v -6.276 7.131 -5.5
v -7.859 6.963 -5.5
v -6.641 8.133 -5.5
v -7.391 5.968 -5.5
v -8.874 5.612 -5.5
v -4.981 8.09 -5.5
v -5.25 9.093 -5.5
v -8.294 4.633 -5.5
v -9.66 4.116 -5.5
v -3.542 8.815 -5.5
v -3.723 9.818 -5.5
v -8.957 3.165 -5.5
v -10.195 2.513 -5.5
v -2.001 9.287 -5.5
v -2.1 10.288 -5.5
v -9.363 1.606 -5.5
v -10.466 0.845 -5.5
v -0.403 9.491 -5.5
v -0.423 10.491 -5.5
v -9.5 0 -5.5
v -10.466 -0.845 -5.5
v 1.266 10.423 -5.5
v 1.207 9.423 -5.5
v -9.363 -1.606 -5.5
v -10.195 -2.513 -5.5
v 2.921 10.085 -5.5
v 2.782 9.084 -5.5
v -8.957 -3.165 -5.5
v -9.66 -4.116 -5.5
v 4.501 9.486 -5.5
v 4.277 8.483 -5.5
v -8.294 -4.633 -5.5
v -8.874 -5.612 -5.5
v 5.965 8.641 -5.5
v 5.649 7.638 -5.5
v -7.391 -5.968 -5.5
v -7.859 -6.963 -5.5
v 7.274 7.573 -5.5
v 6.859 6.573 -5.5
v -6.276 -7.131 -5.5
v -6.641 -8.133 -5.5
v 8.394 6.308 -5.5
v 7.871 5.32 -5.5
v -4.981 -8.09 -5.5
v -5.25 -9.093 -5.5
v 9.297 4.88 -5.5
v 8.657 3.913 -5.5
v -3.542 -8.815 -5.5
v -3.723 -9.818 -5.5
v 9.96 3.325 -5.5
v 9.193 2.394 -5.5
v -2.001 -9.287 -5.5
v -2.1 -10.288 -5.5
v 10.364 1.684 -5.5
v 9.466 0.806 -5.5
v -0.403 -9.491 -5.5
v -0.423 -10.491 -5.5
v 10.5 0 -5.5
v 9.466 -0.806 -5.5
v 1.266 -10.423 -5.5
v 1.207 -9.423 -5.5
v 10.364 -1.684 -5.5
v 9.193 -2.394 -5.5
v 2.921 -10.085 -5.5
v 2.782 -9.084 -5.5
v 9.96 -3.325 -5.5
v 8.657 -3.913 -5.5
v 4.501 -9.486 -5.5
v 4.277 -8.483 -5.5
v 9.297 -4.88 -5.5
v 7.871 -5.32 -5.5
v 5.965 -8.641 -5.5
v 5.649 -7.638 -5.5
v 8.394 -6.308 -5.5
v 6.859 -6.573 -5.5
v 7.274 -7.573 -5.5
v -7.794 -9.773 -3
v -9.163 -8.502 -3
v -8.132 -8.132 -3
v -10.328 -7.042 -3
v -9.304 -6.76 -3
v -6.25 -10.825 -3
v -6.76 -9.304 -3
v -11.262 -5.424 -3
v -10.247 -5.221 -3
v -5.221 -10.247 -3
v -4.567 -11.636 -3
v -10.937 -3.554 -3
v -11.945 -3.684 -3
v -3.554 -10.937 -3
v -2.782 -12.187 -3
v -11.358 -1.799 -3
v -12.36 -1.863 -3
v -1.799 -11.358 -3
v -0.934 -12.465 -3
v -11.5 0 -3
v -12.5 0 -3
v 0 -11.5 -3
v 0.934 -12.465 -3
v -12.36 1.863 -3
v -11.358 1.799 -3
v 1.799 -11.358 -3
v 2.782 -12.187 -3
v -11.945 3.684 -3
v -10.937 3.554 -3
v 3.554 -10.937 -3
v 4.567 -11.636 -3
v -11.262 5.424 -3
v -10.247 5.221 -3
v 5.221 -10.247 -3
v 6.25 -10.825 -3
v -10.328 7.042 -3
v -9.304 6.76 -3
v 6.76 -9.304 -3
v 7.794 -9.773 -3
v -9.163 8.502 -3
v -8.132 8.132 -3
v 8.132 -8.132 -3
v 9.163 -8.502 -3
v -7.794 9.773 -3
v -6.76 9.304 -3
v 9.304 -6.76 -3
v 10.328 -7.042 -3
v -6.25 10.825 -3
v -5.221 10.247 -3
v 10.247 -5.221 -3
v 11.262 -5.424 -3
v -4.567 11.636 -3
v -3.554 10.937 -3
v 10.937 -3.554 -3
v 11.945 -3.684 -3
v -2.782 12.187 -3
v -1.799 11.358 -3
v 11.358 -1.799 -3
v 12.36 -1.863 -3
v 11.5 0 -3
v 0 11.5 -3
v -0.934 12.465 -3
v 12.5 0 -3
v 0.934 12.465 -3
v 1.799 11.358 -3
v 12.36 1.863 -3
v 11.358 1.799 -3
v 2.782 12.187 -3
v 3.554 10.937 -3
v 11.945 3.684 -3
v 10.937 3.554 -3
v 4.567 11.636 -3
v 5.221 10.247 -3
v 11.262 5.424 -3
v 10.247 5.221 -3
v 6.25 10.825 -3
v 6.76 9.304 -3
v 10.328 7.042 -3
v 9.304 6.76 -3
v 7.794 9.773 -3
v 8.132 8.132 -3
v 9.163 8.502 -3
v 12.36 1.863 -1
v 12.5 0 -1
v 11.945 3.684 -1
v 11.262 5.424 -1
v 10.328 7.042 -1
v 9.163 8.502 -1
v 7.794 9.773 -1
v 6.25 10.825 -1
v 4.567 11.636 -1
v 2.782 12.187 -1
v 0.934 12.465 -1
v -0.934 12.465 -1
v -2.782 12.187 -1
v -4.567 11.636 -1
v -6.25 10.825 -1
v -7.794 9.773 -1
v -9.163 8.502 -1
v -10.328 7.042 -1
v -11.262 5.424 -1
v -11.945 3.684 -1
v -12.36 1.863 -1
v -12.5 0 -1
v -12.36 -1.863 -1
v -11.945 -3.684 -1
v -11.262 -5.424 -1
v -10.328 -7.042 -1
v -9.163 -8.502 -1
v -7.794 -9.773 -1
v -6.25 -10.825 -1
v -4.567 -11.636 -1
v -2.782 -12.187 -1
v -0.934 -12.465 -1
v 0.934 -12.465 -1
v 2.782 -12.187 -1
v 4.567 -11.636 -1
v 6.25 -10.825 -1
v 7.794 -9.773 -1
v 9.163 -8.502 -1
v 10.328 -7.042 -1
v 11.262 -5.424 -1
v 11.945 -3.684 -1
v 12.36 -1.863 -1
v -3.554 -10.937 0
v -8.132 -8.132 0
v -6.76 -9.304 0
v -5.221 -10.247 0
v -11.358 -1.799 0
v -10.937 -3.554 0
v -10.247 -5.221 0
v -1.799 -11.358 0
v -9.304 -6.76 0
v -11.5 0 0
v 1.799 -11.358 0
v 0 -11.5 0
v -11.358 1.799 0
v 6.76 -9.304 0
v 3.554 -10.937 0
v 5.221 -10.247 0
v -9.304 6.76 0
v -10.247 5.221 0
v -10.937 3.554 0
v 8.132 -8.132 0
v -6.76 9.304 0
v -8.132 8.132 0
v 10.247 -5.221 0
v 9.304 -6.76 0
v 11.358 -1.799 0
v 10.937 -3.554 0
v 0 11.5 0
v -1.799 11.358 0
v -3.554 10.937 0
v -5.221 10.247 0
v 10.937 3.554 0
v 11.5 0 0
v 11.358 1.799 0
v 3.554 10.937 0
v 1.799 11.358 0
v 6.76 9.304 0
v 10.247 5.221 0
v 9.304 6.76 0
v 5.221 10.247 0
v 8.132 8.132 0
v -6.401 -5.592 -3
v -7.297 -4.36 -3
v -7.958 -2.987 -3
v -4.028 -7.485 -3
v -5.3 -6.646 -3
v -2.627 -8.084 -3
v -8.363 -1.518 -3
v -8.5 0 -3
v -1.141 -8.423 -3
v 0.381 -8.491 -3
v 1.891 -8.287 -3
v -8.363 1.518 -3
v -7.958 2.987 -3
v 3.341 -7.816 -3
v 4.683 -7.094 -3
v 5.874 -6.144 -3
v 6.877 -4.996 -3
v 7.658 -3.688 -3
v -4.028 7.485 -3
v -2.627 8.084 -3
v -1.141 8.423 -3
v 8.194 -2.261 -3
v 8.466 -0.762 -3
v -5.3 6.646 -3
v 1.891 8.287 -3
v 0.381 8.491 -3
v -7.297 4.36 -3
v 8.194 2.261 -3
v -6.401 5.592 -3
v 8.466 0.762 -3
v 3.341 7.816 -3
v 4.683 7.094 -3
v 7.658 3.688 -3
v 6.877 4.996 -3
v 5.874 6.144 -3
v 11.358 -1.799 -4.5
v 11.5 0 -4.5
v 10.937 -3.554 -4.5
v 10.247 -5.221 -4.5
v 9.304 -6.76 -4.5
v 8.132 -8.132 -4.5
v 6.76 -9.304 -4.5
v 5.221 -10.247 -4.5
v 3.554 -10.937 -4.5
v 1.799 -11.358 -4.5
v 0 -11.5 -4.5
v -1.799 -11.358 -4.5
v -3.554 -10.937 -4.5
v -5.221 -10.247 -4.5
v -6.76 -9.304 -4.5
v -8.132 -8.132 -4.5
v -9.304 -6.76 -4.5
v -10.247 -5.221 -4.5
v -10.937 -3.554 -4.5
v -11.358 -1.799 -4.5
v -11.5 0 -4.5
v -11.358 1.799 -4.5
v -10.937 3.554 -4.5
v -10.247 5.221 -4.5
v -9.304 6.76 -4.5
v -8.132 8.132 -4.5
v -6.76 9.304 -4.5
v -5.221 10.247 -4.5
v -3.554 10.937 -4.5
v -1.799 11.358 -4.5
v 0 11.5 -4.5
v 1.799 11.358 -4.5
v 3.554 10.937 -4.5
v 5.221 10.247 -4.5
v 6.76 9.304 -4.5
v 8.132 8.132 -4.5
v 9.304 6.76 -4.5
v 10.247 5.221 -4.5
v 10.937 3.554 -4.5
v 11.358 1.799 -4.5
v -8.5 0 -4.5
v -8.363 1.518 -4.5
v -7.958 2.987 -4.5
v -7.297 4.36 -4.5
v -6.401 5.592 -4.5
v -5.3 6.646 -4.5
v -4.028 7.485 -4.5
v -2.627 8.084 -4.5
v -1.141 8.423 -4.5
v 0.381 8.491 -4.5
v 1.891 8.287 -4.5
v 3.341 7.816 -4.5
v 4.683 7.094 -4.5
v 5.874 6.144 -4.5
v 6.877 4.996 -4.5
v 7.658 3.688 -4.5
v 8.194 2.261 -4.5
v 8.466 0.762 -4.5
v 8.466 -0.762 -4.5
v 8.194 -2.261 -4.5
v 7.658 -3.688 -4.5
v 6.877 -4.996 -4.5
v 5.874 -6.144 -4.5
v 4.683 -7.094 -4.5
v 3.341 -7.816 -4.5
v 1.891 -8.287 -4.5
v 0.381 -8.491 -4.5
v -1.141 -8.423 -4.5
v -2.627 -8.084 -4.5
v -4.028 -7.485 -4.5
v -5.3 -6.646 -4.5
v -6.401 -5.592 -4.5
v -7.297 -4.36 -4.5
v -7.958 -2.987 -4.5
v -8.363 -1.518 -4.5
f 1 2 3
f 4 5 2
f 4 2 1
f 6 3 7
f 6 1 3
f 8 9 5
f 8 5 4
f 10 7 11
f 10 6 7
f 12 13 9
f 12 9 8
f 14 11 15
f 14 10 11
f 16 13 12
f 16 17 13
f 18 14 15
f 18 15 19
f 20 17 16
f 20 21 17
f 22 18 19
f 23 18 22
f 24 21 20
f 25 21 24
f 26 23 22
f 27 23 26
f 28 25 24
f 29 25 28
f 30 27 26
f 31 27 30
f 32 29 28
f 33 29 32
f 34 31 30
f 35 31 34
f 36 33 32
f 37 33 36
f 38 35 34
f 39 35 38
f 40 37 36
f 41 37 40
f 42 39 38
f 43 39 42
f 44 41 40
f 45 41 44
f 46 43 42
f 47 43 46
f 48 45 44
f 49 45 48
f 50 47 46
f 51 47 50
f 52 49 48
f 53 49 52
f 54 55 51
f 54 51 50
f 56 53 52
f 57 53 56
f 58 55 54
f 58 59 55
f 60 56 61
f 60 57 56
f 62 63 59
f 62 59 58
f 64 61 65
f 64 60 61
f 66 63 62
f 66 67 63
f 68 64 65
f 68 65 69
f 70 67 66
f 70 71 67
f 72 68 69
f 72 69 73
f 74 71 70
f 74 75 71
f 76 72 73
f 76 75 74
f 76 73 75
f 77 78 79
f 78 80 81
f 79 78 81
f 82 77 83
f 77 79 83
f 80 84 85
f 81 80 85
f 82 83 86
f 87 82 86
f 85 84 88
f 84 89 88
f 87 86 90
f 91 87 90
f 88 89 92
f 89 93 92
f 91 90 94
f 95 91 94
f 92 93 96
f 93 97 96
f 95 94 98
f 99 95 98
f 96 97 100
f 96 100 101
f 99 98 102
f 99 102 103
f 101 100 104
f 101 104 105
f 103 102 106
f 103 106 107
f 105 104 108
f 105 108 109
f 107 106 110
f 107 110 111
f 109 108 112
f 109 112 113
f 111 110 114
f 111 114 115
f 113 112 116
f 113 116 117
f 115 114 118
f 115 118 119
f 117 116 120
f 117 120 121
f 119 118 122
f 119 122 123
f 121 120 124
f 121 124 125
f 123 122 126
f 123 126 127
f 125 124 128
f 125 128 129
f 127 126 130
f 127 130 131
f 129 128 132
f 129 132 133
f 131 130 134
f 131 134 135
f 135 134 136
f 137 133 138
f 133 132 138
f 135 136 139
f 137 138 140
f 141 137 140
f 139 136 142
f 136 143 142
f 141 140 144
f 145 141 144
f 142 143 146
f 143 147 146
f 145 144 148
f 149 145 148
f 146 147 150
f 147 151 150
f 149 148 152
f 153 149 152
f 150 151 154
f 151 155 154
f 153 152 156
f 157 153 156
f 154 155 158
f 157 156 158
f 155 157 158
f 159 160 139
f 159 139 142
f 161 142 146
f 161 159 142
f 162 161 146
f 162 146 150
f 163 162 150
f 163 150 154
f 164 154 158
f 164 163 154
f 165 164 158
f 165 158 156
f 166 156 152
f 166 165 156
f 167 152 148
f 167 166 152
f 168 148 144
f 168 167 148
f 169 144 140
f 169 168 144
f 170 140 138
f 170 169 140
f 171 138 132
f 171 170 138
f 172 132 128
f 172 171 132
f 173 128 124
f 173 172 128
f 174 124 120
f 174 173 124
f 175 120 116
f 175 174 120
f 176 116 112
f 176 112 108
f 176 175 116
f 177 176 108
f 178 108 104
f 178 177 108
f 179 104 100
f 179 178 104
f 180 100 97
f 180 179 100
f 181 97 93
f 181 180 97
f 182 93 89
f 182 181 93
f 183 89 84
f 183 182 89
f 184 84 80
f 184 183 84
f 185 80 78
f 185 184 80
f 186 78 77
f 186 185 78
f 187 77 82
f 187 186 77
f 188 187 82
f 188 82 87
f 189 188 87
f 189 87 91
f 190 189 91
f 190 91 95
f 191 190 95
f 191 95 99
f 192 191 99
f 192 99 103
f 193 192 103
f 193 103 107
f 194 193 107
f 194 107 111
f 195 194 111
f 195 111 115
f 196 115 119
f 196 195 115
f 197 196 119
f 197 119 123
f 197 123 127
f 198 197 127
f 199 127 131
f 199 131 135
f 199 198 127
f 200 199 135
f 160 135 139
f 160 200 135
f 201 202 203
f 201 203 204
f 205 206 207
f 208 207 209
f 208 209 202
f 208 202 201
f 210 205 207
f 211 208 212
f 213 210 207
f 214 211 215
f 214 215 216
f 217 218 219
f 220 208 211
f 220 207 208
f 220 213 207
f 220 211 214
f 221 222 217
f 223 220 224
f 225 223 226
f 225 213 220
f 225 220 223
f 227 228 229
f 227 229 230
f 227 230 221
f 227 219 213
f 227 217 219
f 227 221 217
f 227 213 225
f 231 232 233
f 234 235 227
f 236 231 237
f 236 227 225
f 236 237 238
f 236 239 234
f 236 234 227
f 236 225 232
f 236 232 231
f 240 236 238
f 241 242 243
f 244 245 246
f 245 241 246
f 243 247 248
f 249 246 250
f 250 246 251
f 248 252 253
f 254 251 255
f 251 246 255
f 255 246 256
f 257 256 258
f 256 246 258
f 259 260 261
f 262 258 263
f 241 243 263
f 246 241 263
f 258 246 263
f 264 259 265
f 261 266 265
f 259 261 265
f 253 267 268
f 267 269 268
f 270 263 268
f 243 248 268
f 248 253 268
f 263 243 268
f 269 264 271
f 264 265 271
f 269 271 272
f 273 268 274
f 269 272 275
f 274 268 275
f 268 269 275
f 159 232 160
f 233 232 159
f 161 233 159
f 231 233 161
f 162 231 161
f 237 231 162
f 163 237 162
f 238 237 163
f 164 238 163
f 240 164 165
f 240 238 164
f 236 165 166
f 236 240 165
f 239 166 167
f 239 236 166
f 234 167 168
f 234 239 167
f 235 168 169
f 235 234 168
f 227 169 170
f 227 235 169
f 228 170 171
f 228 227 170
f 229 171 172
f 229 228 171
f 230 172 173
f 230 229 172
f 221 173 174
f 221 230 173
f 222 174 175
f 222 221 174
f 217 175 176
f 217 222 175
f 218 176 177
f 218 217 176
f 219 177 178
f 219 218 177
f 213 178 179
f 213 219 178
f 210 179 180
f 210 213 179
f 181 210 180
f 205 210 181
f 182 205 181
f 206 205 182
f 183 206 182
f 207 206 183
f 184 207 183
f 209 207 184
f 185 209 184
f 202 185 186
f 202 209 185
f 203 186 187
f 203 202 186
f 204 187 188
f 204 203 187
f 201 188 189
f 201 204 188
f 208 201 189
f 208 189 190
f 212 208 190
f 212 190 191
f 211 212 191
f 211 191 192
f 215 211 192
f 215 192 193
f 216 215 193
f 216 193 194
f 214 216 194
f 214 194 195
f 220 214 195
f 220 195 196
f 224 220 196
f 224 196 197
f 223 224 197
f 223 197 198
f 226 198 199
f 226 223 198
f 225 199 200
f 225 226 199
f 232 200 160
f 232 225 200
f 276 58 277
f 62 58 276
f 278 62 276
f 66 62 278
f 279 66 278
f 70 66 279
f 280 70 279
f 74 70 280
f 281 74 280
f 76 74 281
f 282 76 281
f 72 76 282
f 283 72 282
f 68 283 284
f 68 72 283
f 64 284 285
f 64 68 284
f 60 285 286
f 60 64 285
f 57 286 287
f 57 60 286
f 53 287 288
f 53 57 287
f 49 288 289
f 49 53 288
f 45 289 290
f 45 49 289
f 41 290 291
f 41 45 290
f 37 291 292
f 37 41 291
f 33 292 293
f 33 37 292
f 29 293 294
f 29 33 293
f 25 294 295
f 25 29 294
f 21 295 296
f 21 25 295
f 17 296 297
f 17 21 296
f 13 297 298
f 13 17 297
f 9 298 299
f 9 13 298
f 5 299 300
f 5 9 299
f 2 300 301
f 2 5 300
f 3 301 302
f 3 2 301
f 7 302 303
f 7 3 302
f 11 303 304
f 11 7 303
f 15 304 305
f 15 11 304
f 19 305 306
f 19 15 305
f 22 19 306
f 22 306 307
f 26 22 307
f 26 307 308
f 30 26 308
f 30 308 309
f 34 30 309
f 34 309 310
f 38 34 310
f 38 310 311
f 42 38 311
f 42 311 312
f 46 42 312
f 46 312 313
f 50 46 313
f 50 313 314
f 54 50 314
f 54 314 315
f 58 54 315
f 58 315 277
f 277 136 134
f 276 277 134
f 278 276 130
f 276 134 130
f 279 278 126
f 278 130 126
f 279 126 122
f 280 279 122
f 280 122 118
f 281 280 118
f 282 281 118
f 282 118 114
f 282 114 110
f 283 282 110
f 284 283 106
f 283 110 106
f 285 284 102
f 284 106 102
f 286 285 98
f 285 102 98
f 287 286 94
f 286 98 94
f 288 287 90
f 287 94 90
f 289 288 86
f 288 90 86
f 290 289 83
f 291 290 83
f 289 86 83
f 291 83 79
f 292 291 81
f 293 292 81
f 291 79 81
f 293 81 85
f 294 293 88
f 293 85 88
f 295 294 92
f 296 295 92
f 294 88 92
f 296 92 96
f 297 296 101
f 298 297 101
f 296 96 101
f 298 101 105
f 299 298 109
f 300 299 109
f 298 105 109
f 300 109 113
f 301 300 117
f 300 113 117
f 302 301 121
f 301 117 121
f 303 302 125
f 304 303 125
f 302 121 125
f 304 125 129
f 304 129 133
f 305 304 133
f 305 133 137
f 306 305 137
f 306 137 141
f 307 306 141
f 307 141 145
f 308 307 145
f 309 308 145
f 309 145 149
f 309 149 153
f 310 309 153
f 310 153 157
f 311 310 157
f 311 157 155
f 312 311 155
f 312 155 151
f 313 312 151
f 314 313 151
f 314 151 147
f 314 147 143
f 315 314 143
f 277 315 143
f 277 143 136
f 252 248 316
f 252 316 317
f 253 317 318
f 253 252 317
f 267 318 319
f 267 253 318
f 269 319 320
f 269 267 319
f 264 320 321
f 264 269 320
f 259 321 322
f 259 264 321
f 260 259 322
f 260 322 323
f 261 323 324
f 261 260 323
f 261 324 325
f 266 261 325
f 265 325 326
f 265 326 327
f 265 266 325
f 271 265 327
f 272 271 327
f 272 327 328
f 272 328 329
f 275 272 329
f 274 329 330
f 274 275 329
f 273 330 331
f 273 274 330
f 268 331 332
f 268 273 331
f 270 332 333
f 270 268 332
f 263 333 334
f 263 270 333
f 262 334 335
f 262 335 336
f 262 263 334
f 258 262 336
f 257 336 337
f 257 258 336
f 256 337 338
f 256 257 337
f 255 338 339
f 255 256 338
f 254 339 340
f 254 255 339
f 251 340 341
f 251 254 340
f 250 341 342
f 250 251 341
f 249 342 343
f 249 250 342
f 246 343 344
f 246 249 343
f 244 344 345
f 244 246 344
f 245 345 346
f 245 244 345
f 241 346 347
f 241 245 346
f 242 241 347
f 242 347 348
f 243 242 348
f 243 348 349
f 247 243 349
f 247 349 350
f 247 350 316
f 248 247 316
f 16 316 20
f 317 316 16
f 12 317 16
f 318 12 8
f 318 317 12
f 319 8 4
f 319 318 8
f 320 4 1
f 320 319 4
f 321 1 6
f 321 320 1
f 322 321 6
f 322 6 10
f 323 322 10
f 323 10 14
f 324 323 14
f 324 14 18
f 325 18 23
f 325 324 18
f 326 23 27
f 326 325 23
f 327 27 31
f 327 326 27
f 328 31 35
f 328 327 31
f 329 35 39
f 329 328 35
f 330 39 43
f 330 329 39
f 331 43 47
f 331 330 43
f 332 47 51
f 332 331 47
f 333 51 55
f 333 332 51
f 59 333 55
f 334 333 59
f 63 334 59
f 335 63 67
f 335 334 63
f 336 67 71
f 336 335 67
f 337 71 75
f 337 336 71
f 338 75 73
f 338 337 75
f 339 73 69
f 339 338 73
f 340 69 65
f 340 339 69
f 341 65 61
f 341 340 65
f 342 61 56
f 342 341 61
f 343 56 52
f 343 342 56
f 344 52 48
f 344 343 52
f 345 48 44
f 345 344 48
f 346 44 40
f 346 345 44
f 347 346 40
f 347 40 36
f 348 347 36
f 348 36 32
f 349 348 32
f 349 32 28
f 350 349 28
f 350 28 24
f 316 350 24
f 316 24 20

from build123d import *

# Parameters (mm, degrees)
SKETCH1_R                = 12.5
CORPO_DEPTH              = 3
SKETCH2_R                = 11.5
SKETCH2_R_2              = 8.5
EIXO_DE_ENCAIXE_20_DEPTH = 2.5
CHANFRO_1X45_SIZE        = 1


with BuildPart() as part:
    # Sketch1 → Corpo (new body)
    with BuildSketch(Plane.XY):
        Circle(SKETCH1_R)
    extrude(amount=-CORPO_DEPTH)

    # Sketch2 → Eixo de Encaixe - Ø20 (add)
    with BuildSketch(Plane(origin=(0, 0, -3), x_dir=(-1, 0, 0), z_dir=(0, 0, -1))):
        with Locations(Location((0, 0, 0), (0, 0, 180))):
            Circle(SKETCH2_R)
        Circle(SKETCH2_R_2, mode=Mode.SUBTRACT)
    extrude(amount=EIXO_DE_ENCAIXE_20_DEPTH)

    # Chanfro 1x45°
    chanfro_1x45_edges = [part.edges().sort_by_distance(p)[0] for p in [
        (-12.5, 0, 0),
        (-11.5, 0, -5.5),
        (8.5, 0, -5.5),
    ]]
    chamfer(chanfro_1x45_edges, length=CHANFRO_1X45_SIZE)


solid = part.part
